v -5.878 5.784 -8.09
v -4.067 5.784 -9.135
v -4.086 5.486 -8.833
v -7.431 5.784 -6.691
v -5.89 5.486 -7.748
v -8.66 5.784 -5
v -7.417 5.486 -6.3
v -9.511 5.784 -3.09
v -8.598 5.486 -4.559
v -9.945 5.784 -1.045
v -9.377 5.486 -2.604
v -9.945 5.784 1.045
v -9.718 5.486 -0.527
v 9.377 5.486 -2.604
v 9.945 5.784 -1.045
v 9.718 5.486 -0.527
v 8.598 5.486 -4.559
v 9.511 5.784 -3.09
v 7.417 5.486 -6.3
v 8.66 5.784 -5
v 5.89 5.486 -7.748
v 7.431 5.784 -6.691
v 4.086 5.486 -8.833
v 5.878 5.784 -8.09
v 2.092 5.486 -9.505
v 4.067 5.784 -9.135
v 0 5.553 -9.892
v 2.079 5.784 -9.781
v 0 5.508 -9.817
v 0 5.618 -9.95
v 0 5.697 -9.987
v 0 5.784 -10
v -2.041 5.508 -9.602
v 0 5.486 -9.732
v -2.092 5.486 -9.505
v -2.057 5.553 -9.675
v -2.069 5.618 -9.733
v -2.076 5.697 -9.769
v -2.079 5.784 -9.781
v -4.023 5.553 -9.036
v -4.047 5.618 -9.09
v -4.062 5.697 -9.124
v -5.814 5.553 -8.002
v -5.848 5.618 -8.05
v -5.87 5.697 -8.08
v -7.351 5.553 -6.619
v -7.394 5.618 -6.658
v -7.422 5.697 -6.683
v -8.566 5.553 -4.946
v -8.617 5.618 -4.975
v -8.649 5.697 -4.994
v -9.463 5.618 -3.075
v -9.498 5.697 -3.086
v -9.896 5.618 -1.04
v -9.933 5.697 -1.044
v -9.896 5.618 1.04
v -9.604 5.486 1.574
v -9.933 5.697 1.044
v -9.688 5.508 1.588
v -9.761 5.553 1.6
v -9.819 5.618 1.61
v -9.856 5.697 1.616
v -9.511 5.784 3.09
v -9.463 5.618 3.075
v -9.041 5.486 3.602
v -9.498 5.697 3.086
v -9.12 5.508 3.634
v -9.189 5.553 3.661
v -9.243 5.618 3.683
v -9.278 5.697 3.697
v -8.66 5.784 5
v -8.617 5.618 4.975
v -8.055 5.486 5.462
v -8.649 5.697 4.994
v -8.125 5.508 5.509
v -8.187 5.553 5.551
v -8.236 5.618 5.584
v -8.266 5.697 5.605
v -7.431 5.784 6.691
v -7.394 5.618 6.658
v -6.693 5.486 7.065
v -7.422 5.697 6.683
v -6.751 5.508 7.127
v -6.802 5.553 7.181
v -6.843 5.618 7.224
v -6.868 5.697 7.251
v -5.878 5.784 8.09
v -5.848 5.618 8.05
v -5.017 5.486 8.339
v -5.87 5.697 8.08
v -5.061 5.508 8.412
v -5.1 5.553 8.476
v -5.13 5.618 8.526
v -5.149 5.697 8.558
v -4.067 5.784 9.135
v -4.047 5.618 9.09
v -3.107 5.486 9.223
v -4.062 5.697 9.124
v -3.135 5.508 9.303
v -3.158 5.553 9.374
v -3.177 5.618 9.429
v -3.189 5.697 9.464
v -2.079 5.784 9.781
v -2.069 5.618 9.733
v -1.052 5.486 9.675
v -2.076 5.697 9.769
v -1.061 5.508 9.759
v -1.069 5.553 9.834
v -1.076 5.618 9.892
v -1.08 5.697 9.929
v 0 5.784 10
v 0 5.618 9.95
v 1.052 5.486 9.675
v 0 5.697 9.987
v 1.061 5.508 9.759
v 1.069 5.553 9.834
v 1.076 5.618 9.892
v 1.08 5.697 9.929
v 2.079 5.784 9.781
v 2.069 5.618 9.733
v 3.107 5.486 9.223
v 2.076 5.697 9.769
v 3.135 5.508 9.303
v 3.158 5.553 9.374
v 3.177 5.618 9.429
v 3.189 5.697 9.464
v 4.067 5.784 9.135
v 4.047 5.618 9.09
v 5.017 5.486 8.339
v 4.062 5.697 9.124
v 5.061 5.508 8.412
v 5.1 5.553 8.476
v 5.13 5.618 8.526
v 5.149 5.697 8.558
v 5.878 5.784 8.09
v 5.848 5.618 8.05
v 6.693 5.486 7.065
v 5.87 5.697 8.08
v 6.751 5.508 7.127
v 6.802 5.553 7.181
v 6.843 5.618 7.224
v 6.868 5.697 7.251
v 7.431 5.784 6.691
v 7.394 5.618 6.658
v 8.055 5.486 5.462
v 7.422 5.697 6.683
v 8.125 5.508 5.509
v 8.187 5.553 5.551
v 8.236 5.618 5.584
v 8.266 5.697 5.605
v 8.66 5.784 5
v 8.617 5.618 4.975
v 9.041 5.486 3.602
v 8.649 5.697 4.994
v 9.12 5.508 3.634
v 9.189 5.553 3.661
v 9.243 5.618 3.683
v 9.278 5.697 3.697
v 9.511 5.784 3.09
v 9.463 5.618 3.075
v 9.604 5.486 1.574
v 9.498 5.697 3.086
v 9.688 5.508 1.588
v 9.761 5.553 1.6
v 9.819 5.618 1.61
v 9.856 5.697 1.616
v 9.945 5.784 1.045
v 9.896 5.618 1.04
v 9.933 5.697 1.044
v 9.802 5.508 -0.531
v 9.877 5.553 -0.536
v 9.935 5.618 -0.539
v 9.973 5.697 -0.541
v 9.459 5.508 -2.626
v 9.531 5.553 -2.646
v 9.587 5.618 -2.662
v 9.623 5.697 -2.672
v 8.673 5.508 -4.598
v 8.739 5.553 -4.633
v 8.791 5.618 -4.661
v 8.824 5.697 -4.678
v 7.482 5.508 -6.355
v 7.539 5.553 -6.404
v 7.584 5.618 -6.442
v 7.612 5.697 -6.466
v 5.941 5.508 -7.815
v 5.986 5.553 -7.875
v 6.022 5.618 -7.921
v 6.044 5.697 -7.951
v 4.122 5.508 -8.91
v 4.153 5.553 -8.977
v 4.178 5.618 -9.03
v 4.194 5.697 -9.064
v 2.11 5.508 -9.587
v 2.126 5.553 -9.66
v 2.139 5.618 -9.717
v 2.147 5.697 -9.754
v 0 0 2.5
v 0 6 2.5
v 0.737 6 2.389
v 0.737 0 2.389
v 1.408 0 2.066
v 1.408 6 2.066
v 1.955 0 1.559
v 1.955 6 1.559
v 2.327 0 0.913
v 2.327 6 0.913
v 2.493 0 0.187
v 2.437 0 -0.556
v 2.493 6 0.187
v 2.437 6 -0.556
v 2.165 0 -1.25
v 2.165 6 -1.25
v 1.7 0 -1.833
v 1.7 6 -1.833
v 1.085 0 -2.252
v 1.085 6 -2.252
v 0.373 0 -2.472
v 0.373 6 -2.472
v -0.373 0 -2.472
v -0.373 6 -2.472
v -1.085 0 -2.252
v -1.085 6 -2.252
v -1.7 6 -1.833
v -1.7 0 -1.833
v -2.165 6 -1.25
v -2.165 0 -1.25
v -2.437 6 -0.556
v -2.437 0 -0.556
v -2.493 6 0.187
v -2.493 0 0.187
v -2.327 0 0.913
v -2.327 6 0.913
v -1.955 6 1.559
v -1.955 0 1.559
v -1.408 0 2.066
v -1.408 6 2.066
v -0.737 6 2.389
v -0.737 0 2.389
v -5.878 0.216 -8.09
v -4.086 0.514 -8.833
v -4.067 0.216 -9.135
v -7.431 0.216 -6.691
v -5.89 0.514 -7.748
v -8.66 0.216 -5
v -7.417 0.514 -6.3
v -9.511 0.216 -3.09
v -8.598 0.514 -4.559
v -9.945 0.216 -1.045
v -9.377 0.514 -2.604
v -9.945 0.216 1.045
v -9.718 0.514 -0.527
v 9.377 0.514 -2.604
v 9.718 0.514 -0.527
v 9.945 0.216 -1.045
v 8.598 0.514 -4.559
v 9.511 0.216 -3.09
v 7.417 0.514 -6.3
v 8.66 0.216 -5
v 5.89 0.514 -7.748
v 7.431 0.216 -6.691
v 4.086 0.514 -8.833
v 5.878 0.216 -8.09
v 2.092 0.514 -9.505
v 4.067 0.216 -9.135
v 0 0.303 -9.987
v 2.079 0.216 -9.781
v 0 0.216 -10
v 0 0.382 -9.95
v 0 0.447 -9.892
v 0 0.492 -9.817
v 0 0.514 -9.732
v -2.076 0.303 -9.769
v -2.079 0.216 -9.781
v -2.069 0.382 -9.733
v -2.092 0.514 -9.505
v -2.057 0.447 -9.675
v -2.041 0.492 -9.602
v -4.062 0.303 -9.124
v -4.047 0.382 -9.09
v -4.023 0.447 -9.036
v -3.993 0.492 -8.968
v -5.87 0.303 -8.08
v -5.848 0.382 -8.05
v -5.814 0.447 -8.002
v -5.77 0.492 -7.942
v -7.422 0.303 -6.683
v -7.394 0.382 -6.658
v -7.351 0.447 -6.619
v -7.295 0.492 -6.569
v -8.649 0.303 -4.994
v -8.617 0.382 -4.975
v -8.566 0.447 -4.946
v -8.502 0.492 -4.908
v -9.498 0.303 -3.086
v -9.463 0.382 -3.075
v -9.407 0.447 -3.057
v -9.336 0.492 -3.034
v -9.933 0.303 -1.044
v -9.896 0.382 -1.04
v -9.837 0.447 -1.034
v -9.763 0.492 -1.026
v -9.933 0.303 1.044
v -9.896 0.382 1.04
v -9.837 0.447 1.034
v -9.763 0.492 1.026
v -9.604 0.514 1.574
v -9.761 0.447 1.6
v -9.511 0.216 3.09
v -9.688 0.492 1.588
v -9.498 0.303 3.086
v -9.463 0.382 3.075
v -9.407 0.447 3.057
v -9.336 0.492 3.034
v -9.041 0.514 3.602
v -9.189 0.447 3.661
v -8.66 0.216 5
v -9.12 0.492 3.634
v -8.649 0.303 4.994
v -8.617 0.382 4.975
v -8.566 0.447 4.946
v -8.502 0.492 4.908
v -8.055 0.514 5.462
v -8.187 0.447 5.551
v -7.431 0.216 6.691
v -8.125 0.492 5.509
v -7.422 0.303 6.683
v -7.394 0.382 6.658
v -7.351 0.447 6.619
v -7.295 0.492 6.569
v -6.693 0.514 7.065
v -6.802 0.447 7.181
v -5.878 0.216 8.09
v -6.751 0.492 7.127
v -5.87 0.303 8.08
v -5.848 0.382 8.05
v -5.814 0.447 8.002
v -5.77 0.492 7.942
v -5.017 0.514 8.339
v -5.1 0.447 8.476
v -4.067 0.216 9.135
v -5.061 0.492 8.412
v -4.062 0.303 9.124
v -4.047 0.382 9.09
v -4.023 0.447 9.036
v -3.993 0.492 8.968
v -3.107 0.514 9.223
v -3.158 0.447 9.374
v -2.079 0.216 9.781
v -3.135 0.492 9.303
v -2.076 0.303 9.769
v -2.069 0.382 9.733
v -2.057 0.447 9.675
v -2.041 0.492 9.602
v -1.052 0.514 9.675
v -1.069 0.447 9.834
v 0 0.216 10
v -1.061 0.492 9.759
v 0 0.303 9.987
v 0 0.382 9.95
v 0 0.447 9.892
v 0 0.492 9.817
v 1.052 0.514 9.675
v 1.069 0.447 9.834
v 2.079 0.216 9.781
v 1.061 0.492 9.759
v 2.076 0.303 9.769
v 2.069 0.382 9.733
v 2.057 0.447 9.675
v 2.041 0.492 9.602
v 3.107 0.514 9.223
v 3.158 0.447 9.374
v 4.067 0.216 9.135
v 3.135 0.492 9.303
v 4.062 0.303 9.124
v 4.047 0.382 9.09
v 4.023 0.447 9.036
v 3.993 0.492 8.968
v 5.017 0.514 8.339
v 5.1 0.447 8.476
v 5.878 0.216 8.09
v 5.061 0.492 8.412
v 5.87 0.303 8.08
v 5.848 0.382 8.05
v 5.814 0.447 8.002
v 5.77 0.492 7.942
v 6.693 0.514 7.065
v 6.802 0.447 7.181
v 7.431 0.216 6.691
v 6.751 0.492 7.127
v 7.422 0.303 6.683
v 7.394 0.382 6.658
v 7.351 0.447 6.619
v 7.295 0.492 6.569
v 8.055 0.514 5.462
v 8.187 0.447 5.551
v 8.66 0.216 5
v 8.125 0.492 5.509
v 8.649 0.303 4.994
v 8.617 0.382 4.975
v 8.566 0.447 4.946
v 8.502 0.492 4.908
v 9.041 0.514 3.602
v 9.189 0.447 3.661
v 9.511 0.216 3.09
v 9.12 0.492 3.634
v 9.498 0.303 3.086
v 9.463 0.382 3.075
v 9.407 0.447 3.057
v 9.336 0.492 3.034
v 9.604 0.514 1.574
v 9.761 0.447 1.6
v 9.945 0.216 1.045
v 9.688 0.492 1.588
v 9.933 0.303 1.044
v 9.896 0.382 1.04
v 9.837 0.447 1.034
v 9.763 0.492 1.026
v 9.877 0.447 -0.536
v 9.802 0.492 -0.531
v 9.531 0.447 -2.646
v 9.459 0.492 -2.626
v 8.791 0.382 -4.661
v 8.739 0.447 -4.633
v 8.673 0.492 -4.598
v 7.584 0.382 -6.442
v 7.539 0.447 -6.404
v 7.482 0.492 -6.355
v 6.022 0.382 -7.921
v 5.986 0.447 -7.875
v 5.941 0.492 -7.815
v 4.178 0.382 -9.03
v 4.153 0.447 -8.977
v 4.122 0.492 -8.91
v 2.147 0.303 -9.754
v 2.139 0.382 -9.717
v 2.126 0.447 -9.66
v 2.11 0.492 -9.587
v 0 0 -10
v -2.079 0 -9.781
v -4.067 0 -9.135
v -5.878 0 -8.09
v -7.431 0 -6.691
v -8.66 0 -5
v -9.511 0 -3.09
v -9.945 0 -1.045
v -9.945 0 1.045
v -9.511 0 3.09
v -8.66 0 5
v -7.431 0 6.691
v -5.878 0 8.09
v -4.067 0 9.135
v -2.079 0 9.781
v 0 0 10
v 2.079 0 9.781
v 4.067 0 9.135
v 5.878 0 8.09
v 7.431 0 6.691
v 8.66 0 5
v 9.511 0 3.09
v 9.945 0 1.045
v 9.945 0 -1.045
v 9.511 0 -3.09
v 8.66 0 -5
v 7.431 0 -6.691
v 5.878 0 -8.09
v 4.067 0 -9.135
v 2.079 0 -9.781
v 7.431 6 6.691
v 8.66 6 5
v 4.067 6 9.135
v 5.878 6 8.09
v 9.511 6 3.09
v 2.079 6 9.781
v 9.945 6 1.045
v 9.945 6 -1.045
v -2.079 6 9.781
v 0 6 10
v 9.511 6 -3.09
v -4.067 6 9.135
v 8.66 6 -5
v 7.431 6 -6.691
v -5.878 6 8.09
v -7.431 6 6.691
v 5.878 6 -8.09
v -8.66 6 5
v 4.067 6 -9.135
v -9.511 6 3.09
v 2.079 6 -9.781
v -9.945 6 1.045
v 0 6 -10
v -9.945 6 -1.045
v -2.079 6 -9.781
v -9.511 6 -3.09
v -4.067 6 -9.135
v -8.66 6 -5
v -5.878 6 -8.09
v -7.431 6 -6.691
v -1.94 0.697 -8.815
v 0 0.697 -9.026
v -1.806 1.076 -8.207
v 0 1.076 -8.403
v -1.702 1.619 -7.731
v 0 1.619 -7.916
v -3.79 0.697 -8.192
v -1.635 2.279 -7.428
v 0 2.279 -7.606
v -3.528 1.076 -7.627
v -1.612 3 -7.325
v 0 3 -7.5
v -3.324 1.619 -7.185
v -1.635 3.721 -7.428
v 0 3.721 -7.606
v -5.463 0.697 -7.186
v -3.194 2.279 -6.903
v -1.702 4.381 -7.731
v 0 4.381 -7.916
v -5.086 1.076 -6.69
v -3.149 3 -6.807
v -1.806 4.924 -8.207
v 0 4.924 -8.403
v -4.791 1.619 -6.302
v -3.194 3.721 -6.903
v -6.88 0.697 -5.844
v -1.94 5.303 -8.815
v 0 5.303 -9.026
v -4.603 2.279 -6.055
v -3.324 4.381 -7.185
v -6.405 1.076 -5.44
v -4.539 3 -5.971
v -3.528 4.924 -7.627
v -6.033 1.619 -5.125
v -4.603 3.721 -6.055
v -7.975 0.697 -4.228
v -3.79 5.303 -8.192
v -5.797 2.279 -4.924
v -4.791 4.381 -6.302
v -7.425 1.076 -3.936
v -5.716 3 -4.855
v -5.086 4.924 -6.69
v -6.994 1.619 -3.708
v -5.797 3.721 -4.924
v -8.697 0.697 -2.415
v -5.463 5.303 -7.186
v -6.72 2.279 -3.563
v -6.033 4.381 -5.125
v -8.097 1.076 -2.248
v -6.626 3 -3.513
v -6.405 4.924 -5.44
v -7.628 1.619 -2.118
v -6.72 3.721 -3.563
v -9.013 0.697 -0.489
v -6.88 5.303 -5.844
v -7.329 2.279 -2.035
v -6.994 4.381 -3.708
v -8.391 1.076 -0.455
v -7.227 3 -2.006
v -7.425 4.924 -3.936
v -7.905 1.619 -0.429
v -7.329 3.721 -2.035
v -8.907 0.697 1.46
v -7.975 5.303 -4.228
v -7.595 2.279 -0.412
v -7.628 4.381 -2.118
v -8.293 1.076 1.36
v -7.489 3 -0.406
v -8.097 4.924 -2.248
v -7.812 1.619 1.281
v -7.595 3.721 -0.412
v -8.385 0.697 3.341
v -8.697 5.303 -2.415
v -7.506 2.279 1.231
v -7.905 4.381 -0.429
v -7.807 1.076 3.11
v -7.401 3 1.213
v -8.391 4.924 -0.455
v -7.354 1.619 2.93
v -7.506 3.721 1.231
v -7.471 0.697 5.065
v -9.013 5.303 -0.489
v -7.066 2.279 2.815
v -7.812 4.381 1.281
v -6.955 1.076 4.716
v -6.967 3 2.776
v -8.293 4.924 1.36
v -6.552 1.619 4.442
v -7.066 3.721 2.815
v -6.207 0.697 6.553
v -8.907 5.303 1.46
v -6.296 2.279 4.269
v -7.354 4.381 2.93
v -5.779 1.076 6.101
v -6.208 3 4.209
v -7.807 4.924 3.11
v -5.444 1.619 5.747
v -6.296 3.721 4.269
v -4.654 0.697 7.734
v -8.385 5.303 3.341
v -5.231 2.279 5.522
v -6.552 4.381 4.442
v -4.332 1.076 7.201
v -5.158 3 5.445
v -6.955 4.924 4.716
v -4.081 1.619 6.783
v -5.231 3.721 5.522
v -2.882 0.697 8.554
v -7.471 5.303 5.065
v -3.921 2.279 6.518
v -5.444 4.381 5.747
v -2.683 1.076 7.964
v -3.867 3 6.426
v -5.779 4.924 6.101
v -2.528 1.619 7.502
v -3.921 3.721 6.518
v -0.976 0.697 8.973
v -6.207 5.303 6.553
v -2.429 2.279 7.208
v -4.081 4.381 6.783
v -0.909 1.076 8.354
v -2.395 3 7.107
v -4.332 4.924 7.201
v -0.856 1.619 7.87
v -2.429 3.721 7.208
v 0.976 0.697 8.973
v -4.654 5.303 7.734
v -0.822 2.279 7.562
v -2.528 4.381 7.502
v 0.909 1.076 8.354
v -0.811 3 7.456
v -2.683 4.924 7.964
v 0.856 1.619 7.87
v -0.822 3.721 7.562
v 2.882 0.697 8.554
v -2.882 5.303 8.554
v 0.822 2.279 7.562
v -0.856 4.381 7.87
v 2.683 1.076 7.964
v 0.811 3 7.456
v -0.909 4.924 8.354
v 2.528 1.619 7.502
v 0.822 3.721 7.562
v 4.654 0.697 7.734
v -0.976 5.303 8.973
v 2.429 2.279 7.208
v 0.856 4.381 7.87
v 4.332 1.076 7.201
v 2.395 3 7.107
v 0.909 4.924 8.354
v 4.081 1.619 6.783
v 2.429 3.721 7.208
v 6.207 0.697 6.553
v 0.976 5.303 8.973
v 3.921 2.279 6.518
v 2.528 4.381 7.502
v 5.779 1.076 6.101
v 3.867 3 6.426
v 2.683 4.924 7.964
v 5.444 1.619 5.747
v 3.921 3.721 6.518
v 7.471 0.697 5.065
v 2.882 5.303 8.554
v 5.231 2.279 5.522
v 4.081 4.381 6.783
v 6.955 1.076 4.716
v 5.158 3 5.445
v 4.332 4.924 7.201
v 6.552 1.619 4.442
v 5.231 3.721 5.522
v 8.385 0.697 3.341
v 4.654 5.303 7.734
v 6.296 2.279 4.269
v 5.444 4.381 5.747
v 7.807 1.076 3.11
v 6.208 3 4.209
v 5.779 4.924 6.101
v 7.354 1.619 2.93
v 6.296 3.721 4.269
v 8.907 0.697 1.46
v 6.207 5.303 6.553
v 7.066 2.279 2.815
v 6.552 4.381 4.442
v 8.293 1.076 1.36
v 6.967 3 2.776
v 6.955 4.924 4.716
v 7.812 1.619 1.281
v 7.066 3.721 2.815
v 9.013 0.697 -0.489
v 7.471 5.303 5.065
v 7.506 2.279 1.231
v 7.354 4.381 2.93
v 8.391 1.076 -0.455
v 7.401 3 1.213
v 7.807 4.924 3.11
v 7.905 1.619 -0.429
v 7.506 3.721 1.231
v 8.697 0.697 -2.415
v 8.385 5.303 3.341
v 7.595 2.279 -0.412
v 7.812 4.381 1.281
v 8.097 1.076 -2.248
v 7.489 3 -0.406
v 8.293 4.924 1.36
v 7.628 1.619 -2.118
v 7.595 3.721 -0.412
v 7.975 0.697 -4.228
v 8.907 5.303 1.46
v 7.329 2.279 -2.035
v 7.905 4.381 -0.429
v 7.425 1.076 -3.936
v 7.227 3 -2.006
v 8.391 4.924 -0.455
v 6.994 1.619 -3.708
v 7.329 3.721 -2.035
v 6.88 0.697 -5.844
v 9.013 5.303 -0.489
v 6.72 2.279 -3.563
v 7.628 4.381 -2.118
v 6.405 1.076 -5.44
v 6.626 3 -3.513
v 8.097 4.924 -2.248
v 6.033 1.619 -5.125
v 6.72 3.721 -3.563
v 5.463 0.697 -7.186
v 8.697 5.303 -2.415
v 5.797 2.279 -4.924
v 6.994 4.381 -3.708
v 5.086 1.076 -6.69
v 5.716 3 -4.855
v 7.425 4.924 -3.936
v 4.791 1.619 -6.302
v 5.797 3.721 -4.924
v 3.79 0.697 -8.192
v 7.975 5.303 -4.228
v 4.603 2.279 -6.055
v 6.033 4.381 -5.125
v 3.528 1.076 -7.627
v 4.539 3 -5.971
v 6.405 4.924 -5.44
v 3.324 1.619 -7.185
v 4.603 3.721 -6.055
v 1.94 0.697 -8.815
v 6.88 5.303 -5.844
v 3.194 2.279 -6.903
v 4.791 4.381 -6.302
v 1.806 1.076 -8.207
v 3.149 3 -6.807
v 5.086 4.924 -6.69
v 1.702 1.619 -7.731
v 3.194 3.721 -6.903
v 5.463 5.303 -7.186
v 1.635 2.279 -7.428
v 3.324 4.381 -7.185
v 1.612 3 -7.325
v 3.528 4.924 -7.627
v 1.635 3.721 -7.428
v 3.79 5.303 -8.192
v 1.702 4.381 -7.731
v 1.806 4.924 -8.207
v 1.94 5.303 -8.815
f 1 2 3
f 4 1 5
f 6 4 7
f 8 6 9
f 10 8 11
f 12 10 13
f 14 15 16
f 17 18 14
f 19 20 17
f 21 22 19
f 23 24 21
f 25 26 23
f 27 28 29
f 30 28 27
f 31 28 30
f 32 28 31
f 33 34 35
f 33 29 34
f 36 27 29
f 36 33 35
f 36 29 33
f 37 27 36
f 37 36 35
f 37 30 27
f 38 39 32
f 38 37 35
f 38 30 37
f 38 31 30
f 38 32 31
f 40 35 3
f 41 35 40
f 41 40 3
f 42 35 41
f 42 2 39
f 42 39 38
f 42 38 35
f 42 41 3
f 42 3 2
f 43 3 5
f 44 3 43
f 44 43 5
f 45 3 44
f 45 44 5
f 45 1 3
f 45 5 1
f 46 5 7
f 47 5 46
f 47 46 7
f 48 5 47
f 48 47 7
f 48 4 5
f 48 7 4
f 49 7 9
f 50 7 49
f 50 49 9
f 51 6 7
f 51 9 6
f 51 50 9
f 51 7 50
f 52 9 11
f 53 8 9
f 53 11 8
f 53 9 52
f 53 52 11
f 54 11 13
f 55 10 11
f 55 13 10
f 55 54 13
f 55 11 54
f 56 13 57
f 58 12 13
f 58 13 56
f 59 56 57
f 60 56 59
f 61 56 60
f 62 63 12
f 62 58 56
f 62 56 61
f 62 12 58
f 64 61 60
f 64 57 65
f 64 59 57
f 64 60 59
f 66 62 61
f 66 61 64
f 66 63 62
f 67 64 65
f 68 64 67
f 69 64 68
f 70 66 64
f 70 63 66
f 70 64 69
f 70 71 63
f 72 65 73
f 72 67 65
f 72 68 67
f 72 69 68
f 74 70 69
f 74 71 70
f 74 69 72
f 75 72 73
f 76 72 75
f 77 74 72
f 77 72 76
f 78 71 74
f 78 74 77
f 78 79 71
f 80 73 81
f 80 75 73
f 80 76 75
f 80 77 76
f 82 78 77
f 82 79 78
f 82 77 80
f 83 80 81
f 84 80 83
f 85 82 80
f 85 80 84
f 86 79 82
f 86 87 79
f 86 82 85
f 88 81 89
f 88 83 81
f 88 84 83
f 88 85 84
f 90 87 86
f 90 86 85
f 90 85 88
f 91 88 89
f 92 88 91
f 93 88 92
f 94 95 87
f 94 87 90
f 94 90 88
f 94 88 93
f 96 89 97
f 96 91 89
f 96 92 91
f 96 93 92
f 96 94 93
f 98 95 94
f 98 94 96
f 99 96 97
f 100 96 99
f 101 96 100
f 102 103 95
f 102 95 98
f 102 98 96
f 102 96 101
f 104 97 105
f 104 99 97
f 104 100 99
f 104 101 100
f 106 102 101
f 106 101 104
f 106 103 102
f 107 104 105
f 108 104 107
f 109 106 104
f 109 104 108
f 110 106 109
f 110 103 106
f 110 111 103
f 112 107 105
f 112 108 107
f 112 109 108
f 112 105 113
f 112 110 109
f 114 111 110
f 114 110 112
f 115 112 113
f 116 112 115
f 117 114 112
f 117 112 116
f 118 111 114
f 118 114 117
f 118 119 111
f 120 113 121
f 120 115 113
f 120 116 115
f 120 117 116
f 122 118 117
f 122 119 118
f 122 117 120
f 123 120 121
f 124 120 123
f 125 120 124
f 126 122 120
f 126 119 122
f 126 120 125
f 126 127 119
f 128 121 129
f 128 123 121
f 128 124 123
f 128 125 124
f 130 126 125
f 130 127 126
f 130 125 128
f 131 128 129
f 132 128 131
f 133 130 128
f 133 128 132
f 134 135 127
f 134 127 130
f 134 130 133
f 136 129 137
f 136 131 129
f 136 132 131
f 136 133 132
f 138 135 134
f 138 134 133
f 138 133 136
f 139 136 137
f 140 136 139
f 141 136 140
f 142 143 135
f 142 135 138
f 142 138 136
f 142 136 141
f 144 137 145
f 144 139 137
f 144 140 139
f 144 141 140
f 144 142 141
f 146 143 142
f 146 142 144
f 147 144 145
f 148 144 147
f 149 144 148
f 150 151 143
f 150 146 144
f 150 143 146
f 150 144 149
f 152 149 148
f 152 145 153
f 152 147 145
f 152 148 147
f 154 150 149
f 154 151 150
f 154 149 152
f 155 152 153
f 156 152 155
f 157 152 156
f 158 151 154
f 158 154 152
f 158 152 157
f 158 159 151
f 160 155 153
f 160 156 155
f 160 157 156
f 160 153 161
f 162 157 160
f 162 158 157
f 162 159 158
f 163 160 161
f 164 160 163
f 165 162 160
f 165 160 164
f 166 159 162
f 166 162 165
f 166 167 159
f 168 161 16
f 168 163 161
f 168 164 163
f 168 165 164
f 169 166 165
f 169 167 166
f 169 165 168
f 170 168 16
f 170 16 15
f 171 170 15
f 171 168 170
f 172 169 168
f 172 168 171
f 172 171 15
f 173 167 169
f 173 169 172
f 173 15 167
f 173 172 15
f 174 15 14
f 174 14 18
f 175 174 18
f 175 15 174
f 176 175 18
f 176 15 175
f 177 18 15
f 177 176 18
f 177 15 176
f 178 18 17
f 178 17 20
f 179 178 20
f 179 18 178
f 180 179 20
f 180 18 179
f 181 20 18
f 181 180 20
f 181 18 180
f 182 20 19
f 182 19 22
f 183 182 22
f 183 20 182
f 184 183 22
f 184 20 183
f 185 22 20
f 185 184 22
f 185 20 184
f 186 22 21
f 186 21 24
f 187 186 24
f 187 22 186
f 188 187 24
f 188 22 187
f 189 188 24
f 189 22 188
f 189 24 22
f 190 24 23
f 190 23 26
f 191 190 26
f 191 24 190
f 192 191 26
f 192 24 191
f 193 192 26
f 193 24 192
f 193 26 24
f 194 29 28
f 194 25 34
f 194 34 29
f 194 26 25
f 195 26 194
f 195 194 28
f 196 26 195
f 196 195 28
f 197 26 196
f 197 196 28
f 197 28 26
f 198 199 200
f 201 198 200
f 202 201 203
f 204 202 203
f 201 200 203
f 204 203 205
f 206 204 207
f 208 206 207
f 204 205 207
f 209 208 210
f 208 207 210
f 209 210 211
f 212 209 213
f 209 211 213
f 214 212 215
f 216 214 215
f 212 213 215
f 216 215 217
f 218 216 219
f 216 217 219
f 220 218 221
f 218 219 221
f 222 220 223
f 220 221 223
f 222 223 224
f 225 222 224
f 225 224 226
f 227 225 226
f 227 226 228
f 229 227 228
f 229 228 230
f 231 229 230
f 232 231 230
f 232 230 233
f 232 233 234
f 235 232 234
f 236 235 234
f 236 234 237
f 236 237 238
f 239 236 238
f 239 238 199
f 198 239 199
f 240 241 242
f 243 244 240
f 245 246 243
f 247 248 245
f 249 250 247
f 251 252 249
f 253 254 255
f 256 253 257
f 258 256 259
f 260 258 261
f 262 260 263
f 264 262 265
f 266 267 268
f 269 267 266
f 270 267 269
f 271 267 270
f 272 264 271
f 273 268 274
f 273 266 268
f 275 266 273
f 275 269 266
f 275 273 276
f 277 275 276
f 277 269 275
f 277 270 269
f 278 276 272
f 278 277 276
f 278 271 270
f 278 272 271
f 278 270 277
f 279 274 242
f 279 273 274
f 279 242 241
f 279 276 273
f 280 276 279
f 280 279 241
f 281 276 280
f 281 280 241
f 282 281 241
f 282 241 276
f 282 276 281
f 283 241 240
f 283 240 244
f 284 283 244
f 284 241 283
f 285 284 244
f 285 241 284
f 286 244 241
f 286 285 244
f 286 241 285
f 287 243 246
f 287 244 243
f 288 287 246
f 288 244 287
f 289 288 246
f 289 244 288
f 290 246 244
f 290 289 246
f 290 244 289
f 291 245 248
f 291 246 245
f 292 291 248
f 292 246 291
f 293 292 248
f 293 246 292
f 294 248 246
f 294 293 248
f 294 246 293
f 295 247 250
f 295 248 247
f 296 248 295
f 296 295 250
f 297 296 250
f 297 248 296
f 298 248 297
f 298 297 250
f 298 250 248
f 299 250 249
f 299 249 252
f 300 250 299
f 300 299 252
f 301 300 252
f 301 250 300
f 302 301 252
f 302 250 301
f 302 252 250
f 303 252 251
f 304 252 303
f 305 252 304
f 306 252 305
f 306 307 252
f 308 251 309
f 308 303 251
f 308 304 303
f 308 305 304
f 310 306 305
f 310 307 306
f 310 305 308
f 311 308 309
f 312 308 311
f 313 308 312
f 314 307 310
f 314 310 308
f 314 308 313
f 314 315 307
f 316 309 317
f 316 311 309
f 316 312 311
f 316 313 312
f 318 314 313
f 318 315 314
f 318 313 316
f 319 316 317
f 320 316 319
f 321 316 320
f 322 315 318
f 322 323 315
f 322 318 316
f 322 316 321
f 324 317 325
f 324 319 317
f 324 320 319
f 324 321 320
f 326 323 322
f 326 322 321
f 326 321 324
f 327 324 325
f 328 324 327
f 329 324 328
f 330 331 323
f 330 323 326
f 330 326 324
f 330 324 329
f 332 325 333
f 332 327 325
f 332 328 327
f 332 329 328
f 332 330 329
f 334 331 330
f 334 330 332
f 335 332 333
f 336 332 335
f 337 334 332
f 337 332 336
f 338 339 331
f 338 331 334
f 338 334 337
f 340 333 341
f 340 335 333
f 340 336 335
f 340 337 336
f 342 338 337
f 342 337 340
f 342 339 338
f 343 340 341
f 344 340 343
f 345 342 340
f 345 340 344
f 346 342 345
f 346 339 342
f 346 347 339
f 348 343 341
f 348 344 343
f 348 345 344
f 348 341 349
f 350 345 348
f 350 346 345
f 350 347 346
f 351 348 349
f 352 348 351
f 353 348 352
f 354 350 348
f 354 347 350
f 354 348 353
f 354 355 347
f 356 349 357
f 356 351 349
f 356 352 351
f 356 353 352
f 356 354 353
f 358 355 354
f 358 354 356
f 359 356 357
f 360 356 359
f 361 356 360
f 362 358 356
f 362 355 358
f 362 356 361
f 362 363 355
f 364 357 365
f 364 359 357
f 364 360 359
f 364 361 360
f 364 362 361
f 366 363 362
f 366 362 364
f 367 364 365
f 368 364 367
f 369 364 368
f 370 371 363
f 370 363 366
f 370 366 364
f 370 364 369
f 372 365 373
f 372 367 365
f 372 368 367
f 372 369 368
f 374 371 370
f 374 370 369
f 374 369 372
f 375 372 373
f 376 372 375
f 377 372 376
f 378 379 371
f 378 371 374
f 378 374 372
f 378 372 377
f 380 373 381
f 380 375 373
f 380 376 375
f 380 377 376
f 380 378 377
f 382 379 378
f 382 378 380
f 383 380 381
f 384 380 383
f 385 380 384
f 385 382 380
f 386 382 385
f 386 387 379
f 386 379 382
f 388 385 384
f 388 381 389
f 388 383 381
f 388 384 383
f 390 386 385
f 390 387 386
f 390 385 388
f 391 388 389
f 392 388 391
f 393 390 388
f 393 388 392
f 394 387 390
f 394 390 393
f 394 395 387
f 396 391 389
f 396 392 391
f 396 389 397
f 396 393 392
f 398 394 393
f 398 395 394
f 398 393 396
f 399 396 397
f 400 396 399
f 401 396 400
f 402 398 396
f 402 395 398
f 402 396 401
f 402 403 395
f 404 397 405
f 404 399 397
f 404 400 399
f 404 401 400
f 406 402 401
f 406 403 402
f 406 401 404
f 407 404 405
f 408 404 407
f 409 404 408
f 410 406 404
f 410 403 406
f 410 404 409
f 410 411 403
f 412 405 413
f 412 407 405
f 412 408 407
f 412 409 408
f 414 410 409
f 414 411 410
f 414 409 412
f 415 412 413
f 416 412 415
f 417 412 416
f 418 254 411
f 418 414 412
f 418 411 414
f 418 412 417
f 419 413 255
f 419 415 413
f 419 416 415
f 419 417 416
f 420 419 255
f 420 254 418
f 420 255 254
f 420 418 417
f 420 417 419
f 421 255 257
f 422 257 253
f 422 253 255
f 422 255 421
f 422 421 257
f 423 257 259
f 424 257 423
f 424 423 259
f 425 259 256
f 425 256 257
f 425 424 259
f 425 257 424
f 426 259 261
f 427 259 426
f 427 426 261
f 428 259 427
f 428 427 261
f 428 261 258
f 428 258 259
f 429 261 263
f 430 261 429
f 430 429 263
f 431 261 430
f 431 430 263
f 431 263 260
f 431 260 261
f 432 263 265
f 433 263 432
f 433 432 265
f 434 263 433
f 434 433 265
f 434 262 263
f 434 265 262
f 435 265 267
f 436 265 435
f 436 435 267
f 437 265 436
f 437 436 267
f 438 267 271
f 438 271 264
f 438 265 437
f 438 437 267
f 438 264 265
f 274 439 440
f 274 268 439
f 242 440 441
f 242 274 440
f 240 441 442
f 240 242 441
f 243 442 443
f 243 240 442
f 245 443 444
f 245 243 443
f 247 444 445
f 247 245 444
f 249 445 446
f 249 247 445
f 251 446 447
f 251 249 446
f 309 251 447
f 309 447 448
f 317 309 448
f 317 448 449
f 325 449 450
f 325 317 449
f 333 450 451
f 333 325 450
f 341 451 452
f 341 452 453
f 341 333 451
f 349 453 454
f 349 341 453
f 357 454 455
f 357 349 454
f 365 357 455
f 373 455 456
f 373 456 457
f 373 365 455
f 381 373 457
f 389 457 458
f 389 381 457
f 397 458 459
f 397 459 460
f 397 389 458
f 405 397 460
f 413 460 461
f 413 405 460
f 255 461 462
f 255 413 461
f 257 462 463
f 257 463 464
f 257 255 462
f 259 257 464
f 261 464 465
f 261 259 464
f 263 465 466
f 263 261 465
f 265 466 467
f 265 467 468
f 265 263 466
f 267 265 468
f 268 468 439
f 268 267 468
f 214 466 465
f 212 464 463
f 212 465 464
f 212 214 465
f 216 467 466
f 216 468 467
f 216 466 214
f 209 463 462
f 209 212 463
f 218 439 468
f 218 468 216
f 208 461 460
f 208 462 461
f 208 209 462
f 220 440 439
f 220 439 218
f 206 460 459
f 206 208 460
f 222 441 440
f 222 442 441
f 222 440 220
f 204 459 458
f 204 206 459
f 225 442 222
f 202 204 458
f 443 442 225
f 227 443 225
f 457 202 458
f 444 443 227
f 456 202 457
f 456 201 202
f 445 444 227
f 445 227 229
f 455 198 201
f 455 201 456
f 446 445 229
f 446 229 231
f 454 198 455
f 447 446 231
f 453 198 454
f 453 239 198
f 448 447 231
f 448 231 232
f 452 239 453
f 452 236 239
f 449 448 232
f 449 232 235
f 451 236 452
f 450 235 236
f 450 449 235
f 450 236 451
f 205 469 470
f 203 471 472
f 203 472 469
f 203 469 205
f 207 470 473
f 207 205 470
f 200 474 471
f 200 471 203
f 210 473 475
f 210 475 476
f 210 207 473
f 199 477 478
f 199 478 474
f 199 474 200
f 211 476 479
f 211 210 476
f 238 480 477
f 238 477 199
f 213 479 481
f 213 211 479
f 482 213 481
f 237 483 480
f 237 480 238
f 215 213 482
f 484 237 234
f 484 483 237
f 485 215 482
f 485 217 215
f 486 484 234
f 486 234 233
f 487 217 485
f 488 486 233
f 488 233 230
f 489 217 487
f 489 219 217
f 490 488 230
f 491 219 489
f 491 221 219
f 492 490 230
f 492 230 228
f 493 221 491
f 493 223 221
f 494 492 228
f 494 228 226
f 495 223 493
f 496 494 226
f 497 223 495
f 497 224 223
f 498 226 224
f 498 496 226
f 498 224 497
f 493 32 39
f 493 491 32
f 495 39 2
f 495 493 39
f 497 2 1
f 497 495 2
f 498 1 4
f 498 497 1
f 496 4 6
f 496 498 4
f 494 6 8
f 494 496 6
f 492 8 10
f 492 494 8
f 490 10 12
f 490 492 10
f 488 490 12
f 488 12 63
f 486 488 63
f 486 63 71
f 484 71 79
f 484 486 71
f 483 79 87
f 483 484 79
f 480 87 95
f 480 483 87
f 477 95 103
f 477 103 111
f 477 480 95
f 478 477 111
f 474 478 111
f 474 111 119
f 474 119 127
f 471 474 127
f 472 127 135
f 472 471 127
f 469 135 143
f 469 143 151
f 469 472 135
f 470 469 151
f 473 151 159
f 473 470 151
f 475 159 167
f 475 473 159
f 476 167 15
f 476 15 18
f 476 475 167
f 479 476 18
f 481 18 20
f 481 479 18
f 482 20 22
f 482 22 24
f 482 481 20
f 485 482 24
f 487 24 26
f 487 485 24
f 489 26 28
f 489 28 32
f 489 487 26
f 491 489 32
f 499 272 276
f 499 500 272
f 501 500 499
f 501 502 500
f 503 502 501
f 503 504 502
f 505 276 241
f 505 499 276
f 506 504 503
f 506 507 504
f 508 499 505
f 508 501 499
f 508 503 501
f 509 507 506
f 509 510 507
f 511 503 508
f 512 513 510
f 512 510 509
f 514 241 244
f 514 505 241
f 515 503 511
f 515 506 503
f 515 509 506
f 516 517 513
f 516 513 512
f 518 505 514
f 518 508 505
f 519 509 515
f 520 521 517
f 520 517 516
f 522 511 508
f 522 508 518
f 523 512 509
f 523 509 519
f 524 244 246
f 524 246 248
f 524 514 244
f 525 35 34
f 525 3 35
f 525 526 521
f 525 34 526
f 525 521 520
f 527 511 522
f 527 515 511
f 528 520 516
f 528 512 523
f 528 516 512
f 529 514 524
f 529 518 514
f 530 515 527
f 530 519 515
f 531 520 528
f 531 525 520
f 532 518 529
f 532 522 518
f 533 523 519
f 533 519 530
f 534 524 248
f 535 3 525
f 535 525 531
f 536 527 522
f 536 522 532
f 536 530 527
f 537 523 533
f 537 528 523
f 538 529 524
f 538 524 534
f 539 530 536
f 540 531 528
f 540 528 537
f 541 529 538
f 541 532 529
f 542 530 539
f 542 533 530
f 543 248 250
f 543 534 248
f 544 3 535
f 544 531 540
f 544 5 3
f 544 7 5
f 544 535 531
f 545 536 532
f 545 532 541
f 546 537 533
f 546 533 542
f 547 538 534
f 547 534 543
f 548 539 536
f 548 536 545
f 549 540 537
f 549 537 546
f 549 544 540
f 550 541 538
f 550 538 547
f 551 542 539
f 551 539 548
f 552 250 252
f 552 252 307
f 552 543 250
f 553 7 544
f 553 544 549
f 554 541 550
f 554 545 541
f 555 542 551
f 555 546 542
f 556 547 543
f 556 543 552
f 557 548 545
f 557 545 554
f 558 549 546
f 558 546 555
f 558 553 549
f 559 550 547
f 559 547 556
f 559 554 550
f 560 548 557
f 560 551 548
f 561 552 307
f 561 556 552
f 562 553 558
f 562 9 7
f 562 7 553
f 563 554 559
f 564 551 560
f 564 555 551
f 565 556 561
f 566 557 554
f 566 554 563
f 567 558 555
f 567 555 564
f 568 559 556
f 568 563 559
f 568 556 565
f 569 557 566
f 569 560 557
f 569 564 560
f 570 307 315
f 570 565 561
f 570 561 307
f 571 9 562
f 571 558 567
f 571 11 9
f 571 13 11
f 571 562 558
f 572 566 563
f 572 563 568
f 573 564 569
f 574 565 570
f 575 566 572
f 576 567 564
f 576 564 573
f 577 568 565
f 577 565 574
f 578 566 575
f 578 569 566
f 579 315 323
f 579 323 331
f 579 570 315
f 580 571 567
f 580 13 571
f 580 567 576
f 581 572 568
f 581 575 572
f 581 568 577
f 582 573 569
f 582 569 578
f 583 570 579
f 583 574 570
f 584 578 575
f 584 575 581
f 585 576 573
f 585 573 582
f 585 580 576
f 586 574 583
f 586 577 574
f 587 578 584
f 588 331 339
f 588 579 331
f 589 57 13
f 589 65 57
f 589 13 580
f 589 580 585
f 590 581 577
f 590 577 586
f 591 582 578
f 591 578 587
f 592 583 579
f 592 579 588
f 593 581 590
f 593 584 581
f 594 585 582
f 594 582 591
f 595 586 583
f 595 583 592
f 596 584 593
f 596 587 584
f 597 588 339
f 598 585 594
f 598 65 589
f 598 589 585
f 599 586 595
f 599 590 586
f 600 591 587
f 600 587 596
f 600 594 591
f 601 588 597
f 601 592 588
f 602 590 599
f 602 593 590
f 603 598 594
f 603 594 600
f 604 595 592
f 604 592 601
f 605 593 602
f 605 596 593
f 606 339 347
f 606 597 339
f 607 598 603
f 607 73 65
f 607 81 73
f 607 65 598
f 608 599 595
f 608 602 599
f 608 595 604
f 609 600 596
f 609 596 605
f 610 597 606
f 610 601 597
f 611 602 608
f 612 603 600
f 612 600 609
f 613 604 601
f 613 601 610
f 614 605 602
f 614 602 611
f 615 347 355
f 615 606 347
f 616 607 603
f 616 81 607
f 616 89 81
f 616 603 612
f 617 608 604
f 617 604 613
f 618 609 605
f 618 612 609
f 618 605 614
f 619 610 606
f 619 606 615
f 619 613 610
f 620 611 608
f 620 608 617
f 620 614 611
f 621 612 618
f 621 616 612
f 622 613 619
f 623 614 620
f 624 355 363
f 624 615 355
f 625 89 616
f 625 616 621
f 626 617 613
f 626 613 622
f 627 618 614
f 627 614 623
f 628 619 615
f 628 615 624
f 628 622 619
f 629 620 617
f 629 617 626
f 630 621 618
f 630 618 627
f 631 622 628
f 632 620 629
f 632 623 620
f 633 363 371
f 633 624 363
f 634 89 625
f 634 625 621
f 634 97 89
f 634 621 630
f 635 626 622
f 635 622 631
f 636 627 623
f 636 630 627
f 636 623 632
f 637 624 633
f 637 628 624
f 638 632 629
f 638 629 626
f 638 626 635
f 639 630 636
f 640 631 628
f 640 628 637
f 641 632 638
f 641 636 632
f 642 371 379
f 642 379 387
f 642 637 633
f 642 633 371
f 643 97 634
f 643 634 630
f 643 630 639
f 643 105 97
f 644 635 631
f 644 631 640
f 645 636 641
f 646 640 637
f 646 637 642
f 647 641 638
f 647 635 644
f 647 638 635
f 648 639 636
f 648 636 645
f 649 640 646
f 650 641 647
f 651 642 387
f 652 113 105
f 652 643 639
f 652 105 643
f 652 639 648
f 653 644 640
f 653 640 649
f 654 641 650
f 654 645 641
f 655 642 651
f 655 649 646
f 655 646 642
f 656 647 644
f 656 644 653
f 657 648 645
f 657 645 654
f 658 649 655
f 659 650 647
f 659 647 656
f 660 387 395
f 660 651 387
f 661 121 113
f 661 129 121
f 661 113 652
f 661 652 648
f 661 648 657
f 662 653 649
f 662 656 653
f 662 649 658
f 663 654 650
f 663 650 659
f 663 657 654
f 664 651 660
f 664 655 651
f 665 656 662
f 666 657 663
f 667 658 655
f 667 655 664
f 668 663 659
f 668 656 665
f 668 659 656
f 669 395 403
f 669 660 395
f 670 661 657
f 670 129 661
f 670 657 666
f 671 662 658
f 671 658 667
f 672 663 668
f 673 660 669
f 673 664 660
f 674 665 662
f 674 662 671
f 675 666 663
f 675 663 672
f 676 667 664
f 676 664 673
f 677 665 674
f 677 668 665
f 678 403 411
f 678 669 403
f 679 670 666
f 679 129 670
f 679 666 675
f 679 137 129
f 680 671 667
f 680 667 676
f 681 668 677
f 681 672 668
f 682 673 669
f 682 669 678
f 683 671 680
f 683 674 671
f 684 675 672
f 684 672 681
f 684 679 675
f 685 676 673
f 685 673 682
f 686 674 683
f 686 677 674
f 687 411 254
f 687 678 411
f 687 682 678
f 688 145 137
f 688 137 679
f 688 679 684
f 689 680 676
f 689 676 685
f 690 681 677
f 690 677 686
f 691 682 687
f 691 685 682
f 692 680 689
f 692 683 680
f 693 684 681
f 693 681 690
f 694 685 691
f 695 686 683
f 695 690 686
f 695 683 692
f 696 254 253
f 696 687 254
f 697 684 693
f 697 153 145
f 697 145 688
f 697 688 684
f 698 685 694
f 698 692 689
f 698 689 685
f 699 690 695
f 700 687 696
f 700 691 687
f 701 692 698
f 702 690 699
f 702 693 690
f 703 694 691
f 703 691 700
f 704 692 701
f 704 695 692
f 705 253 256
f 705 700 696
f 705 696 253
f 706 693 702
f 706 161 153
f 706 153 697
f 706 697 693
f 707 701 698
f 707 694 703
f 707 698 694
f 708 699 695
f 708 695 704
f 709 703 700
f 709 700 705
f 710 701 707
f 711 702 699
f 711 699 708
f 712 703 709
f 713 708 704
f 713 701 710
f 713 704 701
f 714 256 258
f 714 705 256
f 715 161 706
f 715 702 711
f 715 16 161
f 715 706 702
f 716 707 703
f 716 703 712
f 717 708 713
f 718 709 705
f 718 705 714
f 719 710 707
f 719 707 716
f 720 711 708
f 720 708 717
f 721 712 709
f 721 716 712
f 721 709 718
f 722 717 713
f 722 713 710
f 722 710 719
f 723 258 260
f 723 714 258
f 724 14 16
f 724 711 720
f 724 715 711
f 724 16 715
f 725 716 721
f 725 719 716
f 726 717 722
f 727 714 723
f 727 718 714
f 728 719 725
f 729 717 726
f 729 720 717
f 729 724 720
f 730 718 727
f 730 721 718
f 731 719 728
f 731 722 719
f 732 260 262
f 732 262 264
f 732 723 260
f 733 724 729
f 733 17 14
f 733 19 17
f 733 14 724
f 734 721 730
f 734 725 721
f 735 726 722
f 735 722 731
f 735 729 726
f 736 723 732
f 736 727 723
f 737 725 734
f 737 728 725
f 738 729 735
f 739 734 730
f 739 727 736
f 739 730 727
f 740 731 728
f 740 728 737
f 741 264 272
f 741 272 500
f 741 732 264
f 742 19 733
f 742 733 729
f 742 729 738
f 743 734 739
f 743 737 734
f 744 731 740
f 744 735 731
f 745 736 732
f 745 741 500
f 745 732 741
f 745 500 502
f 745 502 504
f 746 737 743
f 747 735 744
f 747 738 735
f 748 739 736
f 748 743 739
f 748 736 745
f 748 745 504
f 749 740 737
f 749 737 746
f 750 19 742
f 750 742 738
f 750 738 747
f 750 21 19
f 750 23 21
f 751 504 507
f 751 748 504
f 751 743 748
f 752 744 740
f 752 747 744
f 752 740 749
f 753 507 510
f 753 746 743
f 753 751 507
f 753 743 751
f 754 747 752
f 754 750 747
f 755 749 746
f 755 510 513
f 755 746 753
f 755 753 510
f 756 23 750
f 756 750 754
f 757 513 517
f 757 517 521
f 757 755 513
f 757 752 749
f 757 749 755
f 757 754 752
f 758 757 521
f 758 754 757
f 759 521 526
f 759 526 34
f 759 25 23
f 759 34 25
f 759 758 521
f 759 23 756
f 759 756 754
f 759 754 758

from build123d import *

# Parameters (mm, degrees)
SKETCH3_R          = 2.5
CUT_EXTRUDE1_DEPTH = 10


with BuildPart() as part:
    # Sketch2 → Revolve1 (revolve)
    with BuildSketch(Plane.XY, mode=Mode.PRIVATE) as revolve1_sk:
        with BuildLine():
            Line((0, 0), (10, 0))
            Line((10, 0), (10, 0.216117819))
            ThreePointArc((10, 0.216117819), (9.923207143, 0.41656375), (9.732142857, 0.514390909))
            ThreePointArc((9.732142857, 0.514390909), (7.5, 3), (9.732142857, 5.485609091))
            ThreePointArc((9.732142857, 5.485609091), (9.923207143, 5.58343625), (10, 5.783882181))
            Line((10, 5.783882181), (10, 6))
            Line((10, 6), (0, 6))
            Line((0, 6), (0, 0))
        make_face()
    revolve(revolve1_sk.sketch.rotate(Axis((0, 0, 0), (0, 1, 0)), 90), axis=Axis((0, 0, 0), (0, 1, 0)))

    # Sketch3 → Cut-Extrude1 (cut)
    with BuildSketch(Plane(origin=(0, 6, 0), x_dir=(1, 0, 0), z_dir=(0, 1, 0))):
        with Locations(Location((0, 0, 0), (0, 0, 270))):
            Circle(SKETCH3_R)
    extrude(amount=-CUT_EXTRUDE1_DEPTH, mode=Mode.SUBTRACT)


solid = part.part
